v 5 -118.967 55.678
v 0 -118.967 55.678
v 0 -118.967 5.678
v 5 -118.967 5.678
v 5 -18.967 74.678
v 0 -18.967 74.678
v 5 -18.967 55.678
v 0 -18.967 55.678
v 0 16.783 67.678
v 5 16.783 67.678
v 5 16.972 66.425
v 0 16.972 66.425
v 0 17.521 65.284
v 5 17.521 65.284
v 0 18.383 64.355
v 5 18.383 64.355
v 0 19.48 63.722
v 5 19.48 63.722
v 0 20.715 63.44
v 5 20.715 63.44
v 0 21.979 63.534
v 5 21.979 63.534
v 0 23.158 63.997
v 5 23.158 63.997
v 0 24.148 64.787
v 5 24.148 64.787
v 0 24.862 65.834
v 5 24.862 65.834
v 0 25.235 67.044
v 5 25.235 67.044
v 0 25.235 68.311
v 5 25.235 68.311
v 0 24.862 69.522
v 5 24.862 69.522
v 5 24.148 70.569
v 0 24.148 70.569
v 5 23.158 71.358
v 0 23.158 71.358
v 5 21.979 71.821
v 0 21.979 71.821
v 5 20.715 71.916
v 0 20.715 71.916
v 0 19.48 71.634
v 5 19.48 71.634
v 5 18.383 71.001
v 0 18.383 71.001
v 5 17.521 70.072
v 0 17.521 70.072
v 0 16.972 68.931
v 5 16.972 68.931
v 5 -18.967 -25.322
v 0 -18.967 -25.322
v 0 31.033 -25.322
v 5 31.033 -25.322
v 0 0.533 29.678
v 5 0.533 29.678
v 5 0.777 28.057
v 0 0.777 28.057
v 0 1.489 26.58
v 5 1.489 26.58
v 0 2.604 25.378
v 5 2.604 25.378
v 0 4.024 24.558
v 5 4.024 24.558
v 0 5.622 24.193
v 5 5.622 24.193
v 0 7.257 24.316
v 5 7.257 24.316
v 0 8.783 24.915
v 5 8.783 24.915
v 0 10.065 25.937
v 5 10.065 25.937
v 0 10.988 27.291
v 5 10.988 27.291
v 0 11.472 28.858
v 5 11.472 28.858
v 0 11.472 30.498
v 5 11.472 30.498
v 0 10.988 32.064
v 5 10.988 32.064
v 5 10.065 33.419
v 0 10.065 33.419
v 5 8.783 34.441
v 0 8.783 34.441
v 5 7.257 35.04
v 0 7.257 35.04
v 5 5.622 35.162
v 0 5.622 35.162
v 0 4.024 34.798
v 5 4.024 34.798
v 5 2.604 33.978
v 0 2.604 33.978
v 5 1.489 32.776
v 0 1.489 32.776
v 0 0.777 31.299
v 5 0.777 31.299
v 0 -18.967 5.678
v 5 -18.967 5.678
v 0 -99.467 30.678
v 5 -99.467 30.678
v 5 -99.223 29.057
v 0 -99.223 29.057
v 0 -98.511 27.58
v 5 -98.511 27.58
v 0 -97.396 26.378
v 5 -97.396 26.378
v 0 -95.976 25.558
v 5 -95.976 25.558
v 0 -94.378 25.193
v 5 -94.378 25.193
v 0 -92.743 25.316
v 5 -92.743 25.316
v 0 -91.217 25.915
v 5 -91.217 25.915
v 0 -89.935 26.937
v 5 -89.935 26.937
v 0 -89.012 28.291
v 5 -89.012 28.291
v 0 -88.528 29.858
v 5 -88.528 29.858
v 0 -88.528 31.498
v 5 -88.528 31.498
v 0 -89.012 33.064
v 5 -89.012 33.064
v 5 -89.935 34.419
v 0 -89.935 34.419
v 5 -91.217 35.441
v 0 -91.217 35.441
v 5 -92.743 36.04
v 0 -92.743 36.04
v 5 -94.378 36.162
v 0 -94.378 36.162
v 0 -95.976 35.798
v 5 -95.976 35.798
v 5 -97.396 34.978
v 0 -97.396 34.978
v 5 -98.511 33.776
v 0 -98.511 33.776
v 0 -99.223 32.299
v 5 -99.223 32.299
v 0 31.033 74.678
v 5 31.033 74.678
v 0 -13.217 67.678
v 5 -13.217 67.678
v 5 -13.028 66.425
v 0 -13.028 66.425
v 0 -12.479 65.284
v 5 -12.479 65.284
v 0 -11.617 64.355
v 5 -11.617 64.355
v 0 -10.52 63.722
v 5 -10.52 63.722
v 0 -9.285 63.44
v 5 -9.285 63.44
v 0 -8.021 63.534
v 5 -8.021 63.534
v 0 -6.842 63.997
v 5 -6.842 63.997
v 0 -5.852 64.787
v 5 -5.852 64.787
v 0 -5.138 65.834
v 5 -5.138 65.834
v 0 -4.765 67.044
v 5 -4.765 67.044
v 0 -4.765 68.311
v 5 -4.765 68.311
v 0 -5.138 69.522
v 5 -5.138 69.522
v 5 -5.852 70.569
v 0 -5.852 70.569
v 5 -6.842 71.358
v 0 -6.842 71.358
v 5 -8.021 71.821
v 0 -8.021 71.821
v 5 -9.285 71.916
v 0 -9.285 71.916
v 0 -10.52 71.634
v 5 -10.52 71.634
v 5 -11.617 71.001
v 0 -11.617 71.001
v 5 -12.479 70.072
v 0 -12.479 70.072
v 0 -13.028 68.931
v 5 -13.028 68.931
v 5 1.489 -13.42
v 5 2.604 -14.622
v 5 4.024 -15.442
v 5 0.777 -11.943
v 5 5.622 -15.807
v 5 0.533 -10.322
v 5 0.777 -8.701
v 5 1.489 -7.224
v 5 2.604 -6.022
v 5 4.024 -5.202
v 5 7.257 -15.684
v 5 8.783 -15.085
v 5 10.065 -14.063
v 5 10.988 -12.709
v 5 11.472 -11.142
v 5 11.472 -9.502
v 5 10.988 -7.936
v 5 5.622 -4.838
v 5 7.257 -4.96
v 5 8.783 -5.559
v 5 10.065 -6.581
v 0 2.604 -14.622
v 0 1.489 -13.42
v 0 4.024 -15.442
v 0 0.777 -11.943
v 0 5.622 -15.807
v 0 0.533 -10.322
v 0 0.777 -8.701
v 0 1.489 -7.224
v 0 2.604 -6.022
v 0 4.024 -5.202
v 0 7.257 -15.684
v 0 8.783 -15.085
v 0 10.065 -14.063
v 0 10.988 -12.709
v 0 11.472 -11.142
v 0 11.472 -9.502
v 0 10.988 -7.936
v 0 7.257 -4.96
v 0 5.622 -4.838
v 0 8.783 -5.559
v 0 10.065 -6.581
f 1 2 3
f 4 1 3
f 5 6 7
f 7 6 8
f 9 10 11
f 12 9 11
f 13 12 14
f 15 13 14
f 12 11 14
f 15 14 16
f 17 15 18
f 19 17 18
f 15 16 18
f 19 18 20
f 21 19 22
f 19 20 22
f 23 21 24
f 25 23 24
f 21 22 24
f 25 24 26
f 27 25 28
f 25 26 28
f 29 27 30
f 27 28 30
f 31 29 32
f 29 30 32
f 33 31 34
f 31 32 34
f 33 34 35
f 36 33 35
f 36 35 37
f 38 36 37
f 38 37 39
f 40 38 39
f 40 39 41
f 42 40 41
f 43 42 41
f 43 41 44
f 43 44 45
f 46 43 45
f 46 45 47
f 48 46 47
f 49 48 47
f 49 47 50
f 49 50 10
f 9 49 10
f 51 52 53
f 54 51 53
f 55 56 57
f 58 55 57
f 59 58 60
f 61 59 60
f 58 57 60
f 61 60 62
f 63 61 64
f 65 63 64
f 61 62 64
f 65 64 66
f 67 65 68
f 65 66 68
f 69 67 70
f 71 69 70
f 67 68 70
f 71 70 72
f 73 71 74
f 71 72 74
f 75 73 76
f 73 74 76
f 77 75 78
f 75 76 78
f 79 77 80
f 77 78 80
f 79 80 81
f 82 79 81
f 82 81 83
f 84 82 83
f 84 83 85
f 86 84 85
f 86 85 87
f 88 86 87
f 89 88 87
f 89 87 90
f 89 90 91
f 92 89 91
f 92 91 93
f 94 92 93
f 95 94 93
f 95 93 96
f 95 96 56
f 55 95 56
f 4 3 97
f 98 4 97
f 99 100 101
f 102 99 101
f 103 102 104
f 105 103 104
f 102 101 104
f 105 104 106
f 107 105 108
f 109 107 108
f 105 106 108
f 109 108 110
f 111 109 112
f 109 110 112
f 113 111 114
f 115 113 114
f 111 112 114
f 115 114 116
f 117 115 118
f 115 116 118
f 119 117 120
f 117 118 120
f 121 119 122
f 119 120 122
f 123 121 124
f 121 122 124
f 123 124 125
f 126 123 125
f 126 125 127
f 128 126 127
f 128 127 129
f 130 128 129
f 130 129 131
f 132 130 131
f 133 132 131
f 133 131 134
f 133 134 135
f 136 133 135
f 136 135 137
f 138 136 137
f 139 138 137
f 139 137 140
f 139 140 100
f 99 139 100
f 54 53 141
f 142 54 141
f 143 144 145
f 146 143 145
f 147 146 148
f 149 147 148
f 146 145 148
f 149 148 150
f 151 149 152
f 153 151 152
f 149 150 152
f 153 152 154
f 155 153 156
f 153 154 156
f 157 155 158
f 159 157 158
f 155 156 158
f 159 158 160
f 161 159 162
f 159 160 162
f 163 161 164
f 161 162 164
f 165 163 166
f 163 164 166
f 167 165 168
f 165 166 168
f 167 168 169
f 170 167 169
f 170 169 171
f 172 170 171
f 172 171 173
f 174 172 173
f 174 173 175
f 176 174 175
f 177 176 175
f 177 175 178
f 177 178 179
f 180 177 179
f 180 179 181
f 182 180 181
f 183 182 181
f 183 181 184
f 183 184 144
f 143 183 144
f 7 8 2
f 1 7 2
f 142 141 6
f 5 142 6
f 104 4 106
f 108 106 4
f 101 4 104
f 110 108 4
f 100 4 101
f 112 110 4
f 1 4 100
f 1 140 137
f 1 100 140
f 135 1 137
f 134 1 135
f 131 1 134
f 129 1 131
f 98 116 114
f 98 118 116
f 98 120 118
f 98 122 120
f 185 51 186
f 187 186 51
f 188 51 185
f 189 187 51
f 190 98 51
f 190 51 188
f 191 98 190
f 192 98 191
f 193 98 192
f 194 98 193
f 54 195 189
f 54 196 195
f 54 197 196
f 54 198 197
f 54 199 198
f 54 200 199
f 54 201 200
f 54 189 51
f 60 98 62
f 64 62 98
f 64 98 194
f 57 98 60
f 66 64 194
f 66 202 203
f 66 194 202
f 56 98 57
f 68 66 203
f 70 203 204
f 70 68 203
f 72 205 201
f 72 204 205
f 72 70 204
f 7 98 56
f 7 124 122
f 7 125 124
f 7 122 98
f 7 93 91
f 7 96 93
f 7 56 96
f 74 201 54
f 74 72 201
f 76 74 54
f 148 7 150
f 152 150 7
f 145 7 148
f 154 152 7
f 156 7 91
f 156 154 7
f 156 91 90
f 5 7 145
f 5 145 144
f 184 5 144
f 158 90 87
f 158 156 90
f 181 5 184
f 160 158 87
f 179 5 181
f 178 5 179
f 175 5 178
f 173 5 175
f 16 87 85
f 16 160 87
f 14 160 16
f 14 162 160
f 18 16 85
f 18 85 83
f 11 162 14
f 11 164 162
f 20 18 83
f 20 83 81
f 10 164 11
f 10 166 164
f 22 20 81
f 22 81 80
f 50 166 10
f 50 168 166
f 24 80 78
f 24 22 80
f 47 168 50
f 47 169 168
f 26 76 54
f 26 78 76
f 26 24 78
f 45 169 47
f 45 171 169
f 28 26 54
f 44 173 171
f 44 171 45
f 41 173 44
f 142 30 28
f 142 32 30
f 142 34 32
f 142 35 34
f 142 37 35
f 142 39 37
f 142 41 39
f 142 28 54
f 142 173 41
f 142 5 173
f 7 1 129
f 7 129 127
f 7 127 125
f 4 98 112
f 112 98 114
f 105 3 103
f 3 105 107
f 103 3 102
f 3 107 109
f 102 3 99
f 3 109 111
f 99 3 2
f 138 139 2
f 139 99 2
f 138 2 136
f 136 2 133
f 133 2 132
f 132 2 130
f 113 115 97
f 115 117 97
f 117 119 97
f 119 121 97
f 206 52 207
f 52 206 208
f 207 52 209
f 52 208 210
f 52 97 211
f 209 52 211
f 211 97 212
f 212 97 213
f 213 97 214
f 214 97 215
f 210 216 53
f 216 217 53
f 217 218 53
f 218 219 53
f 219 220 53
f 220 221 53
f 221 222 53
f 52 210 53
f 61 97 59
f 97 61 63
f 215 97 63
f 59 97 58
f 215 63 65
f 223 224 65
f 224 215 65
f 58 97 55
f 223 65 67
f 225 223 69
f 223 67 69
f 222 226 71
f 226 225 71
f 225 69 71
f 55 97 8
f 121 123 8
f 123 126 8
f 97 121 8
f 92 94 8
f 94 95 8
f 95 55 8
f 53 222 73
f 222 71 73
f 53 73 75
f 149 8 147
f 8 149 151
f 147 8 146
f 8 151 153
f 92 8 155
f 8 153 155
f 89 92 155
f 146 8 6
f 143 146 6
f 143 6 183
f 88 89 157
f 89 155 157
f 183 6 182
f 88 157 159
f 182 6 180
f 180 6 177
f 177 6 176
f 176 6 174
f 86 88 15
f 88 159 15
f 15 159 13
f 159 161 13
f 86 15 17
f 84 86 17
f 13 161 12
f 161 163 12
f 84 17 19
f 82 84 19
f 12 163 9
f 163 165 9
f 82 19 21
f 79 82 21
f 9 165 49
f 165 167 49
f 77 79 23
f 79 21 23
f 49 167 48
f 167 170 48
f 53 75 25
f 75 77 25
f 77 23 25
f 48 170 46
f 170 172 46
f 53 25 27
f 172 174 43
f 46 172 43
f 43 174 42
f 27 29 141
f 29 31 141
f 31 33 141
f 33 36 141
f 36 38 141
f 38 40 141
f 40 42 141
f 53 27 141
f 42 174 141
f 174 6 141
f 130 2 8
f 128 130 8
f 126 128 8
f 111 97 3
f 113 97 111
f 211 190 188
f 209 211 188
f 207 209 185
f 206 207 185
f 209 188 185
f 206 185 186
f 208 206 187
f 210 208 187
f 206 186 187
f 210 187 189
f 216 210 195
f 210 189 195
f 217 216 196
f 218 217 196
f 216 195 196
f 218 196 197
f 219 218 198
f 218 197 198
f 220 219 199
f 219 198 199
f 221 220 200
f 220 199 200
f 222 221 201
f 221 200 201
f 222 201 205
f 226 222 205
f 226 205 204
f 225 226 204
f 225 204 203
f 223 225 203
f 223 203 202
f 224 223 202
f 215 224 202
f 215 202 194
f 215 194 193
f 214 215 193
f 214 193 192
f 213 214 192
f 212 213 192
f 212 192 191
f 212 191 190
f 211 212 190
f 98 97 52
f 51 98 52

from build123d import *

# Parameters (mm, degrees)
F1_DEPTH = 5
F2_D     = 8.5
F3_D     = 11


# Not quite as in the source:
# - a feature names something its author has since deleted; it is built from what else it names


with BuildPart() as f1:
    # F0 (on Right) → F1 (new body)
    with BuildSketch(Plane.YZ):
        Polygon((31.0329496861, 74.6778247207), (-18.9670503139, 74.6778247207), (-18.9670503139, 55.6778247207), (-118.9670503139, 55.6778247207), (-118.9670503139, 5.6778247207), (-18.9670503139, 5.6778247207), (-18.9670503139, -25.3221752793), (31.0329496861, -25.3221752793), align=None)
    extrude(amount=F1_DEPTH)

    # F2 (through all)
    with Locations(Plane(origin=(0, 0, 0), x_dir=(0, 1, 0), z_dir=(-1, 0, 0))):
        with Locations((-8.9670503139, -67.6778247207), (21.0329496861, -67.6778247207)):
            Hole(F2_D / 2)

    # F3 (through all)
    with Locations(Plane(origin=(0, 0, 0), x_dir=(0, 1, 0), z_dir=(-1, 0, 0))):
        with Locations((6.0329496861, -29.6778247207), (6.0329496861, 10.3221752793), (-93.9670503139, -30.6778247207)):
            Hole(F3_D / 2)


solid = f1.part
